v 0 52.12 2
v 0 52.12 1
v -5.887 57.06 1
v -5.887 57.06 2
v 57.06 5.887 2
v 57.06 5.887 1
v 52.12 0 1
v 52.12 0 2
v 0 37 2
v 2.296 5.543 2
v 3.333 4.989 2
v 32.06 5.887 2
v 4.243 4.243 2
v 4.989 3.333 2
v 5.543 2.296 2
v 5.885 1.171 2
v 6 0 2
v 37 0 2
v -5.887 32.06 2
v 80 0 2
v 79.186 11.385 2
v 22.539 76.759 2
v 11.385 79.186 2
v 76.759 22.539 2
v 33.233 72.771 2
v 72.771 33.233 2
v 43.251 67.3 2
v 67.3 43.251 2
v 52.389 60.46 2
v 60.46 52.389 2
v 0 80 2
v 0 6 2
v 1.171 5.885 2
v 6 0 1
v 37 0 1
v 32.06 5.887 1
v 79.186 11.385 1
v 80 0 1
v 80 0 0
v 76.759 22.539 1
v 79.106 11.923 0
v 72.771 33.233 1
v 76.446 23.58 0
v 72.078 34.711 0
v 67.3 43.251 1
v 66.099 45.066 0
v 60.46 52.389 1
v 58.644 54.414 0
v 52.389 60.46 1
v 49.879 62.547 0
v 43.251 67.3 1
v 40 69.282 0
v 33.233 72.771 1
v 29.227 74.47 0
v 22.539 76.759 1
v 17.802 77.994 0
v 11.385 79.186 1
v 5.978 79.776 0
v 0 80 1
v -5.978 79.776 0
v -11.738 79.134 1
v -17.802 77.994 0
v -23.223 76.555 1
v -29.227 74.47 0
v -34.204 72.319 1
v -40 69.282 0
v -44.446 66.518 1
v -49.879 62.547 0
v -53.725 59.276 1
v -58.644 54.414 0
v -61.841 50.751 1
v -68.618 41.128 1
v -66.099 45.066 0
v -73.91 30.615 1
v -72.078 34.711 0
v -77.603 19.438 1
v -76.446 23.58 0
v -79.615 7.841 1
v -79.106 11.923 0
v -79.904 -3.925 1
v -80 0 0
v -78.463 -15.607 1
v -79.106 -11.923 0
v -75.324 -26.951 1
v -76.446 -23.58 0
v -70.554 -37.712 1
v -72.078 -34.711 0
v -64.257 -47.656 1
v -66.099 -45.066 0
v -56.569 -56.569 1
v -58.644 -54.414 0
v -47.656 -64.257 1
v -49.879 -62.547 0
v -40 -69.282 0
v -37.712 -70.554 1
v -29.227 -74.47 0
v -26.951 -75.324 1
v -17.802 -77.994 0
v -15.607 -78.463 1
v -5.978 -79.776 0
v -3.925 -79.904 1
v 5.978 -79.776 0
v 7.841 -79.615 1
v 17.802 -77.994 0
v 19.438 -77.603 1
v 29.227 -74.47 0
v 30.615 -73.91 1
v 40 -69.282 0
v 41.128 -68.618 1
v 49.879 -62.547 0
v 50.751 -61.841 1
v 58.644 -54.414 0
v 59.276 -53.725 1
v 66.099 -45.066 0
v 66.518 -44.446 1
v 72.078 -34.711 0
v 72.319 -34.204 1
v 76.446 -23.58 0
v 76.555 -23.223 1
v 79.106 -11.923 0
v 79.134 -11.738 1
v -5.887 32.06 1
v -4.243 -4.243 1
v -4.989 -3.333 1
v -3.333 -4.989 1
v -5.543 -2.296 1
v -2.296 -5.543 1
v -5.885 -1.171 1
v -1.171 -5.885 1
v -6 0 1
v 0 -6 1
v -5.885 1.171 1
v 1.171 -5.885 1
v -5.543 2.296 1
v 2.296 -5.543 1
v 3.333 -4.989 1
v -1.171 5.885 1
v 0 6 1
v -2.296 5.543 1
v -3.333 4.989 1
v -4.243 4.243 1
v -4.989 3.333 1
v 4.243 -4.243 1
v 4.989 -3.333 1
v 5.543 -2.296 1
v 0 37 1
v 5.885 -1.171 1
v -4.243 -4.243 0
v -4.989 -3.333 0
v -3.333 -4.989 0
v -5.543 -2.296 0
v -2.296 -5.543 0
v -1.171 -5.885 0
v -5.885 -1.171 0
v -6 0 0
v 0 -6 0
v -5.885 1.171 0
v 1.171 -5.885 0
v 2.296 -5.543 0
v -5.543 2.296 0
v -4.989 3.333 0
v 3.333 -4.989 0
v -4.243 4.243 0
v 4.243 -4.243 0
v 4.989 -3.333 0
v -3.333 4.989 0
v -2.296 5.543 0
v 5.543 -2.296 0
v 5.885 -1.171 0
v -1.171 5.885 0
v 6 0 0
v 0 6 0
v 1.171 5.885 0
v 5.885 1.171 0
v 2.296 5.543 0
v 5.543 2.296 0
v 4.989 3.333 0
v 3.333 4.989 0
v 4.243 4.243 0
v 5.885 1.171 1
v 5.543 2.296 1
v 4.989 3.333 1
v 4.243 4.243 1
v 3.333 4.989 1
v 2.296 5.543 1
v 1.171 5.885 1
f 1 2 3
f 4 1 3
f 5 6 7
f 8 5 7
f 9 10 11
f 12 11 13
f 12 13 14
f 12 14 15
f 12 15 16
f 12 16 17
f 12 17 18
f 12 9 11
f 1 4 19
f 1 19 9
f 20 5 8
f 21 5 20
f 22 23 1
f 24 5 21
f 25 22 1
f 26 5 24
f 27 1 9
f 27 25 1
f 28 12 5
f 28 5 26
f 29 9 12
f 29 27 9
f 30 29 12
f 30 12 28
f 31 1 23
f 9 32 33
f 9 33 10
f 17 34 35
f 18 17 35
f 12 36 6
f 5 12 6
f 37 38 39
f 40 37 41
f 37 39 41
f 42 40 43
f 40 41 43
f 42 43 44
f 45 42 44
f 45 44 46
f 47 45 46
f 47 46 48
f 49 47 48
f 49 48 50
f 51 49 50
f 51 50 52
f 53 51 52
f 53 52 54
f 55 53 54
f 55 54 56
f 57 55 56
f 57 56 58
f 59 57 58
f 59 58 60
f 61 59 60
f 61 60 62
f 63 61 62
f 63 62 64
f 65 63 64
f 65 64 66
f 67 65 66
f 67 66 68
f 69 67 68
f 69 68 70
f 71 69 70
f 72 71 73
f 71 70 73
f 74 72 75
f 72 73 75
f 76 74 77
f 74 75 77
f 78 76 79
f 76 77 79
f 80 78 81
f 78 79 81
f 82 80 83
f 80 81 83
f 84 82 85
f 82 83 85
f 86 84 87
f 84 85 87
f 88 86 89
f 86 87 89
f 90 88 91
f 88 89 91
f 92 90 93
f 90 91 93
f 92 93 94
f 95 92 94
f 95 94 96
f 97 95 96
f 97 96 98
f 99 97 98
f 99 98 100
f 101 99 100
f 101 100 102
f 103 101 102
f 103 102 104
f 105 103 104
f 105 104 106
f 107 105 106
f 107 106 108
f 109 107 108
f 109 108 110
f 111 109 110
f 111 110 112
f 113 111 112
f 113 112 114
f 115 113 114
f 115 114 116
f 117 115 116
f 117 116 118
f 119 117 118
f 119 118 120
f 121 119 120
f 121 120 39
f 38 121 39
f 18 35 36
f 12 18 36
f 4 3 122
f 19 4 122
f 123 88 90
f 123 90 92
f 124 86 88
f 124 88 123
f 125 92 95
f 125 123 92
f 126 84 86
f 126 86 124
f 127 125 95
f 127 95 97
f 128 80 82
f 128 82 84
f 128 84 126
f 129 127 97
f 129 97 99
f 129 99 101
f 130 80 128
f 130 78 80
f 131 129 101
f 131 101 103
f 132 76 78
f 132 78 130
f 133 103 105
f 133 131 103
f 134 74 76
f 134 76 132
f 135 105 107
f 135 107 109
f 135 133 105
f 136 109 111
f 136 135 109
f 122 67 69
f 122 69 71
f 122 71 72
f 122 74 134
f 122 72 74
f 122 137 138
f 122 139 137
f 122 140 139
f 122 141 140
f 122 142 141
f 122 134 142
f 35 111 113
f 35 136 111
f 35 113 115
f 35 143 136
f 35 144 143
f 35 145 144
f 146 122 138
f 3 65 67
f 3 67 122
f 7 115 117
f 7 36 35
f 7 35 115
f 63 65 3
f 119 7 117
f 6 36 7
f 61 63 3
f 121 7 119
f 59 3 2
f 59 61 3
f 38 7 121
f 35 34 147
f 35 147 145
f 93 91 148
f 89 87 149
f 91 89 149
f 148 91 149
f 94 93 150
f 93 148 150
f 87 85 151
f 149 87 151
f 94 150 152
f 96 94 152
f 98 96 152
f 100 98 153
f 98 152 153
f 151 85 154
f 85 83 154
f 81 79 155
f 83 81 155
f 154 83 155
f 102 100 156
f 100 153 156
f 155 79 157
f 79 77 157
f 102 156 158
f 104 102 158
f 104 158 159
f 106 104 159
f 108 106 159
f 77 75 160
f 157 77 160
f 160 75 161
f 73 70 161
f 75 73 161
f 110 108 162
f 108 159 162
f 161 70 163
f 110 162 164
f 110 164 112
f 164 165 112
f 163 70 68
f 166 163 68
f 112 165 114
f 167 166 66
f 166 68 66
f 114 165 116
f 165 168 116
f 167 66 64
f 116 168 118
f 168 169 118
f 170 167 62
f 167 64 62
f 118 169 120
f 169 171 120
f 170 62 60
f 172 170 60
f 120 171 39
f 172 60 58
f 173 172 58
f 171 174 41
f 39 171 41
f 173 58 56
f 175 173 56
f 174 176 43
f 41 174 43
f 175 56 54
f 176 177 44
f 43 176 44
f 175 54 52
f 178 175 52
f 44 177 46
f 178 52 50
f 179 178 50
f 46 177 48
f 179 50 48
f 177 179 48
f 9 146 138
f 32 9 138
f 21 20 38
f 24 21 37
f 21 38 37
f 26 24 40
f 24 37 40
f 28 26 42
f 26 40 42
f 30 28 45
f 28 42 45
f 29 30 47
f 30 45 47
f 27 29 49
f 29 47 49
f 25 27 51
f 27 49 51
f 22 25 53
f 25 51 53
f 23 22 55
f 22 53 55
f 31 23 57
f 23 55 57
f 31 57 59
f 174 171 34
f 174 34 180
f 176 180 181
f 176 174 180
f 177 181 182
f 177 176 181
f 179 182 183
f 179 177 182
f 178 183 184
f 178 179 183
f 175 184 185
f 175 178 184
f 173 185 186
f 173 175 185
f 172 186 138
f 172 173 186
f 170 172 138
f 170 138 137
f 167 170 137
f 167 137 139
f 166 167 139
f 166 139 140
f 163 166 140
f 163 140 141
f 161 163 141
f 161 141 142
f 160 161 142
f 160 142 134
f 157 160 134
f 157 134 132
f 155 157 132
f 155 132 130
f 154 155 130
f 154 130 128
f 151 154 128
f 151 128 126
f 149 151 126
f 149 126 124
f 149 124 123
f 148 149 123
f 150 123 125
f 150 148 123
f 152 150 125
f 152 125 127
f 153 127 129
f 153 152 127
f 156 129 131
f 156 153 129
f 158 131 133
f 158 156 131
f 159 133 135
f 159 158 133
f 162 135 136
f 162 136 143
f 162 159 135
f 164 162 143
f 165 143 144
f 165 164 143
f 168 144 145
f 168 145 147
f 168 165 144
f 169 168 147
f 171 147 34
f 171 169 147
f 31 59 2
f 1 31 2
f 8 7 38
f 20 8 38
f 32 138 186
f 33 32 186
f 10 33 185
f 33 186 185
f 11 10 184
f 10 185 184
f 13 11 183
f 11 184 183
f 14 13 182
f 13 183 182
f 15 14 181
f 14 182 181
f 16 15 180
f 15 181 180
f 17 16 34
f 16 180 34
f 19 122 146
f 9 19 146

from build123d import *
from build123d import SkipClean  # not in build123d's __all__

# Parameters (mm, degrees)
F0_R     = 80
F0_R_2   = 6
F1_DEPTH = 1
F3_DEPTH = 1


with BuildPart() as f1:
    # F0 (on Top) → F1 (new body)
    with BuildSketch(Plane.XY):
        Circle(F0_R)
        Circle(F0_R_2, mode=Mode.SUBTRACT)
    extrude(amount=F1_DEPTH)

    # F2 (on face) → F3 (join)
    with BuildSketch(Plane.XY.offset(1)):
        with BuildLine():
            ThreePointArc((80, 0), (56.5685424949, 56.5685424949), (0, 80))
            Line((0, 80), (0, 52.1204726901))
            Line((0, 52.1204726901), (-5.8869810823, 57.0602363451))
            Line((-5.8869810823, 57.0602363451), (-5.8869810823, 32.0602363451))
            Line((-5.8869810823, 32.0602363451), (0, 37))
            Line((0, 37), (0, 6))
            ThreePointArc((0, 6), (4.2426406871, 4.2426406871), (6, 0))
            Line((6, 0), (37, 0))
            Line((37, 0), (32.0602363451, 5.8869810823))
            Line((32.0602363451, 5.8869810823), (57.0602363451, 5.8869810823))
            Line((57.0602363451, 5.8869810823), (52.1204726901, 0))
            Line((52.1204726901, 0), (80, 0))
        make_face()
    with SkipClean():  # cleaning this boolean's faces spoils the solid; the shape is the same uncleaned
        extrude(amount=F3_DEPTH)


solid = f1.part
